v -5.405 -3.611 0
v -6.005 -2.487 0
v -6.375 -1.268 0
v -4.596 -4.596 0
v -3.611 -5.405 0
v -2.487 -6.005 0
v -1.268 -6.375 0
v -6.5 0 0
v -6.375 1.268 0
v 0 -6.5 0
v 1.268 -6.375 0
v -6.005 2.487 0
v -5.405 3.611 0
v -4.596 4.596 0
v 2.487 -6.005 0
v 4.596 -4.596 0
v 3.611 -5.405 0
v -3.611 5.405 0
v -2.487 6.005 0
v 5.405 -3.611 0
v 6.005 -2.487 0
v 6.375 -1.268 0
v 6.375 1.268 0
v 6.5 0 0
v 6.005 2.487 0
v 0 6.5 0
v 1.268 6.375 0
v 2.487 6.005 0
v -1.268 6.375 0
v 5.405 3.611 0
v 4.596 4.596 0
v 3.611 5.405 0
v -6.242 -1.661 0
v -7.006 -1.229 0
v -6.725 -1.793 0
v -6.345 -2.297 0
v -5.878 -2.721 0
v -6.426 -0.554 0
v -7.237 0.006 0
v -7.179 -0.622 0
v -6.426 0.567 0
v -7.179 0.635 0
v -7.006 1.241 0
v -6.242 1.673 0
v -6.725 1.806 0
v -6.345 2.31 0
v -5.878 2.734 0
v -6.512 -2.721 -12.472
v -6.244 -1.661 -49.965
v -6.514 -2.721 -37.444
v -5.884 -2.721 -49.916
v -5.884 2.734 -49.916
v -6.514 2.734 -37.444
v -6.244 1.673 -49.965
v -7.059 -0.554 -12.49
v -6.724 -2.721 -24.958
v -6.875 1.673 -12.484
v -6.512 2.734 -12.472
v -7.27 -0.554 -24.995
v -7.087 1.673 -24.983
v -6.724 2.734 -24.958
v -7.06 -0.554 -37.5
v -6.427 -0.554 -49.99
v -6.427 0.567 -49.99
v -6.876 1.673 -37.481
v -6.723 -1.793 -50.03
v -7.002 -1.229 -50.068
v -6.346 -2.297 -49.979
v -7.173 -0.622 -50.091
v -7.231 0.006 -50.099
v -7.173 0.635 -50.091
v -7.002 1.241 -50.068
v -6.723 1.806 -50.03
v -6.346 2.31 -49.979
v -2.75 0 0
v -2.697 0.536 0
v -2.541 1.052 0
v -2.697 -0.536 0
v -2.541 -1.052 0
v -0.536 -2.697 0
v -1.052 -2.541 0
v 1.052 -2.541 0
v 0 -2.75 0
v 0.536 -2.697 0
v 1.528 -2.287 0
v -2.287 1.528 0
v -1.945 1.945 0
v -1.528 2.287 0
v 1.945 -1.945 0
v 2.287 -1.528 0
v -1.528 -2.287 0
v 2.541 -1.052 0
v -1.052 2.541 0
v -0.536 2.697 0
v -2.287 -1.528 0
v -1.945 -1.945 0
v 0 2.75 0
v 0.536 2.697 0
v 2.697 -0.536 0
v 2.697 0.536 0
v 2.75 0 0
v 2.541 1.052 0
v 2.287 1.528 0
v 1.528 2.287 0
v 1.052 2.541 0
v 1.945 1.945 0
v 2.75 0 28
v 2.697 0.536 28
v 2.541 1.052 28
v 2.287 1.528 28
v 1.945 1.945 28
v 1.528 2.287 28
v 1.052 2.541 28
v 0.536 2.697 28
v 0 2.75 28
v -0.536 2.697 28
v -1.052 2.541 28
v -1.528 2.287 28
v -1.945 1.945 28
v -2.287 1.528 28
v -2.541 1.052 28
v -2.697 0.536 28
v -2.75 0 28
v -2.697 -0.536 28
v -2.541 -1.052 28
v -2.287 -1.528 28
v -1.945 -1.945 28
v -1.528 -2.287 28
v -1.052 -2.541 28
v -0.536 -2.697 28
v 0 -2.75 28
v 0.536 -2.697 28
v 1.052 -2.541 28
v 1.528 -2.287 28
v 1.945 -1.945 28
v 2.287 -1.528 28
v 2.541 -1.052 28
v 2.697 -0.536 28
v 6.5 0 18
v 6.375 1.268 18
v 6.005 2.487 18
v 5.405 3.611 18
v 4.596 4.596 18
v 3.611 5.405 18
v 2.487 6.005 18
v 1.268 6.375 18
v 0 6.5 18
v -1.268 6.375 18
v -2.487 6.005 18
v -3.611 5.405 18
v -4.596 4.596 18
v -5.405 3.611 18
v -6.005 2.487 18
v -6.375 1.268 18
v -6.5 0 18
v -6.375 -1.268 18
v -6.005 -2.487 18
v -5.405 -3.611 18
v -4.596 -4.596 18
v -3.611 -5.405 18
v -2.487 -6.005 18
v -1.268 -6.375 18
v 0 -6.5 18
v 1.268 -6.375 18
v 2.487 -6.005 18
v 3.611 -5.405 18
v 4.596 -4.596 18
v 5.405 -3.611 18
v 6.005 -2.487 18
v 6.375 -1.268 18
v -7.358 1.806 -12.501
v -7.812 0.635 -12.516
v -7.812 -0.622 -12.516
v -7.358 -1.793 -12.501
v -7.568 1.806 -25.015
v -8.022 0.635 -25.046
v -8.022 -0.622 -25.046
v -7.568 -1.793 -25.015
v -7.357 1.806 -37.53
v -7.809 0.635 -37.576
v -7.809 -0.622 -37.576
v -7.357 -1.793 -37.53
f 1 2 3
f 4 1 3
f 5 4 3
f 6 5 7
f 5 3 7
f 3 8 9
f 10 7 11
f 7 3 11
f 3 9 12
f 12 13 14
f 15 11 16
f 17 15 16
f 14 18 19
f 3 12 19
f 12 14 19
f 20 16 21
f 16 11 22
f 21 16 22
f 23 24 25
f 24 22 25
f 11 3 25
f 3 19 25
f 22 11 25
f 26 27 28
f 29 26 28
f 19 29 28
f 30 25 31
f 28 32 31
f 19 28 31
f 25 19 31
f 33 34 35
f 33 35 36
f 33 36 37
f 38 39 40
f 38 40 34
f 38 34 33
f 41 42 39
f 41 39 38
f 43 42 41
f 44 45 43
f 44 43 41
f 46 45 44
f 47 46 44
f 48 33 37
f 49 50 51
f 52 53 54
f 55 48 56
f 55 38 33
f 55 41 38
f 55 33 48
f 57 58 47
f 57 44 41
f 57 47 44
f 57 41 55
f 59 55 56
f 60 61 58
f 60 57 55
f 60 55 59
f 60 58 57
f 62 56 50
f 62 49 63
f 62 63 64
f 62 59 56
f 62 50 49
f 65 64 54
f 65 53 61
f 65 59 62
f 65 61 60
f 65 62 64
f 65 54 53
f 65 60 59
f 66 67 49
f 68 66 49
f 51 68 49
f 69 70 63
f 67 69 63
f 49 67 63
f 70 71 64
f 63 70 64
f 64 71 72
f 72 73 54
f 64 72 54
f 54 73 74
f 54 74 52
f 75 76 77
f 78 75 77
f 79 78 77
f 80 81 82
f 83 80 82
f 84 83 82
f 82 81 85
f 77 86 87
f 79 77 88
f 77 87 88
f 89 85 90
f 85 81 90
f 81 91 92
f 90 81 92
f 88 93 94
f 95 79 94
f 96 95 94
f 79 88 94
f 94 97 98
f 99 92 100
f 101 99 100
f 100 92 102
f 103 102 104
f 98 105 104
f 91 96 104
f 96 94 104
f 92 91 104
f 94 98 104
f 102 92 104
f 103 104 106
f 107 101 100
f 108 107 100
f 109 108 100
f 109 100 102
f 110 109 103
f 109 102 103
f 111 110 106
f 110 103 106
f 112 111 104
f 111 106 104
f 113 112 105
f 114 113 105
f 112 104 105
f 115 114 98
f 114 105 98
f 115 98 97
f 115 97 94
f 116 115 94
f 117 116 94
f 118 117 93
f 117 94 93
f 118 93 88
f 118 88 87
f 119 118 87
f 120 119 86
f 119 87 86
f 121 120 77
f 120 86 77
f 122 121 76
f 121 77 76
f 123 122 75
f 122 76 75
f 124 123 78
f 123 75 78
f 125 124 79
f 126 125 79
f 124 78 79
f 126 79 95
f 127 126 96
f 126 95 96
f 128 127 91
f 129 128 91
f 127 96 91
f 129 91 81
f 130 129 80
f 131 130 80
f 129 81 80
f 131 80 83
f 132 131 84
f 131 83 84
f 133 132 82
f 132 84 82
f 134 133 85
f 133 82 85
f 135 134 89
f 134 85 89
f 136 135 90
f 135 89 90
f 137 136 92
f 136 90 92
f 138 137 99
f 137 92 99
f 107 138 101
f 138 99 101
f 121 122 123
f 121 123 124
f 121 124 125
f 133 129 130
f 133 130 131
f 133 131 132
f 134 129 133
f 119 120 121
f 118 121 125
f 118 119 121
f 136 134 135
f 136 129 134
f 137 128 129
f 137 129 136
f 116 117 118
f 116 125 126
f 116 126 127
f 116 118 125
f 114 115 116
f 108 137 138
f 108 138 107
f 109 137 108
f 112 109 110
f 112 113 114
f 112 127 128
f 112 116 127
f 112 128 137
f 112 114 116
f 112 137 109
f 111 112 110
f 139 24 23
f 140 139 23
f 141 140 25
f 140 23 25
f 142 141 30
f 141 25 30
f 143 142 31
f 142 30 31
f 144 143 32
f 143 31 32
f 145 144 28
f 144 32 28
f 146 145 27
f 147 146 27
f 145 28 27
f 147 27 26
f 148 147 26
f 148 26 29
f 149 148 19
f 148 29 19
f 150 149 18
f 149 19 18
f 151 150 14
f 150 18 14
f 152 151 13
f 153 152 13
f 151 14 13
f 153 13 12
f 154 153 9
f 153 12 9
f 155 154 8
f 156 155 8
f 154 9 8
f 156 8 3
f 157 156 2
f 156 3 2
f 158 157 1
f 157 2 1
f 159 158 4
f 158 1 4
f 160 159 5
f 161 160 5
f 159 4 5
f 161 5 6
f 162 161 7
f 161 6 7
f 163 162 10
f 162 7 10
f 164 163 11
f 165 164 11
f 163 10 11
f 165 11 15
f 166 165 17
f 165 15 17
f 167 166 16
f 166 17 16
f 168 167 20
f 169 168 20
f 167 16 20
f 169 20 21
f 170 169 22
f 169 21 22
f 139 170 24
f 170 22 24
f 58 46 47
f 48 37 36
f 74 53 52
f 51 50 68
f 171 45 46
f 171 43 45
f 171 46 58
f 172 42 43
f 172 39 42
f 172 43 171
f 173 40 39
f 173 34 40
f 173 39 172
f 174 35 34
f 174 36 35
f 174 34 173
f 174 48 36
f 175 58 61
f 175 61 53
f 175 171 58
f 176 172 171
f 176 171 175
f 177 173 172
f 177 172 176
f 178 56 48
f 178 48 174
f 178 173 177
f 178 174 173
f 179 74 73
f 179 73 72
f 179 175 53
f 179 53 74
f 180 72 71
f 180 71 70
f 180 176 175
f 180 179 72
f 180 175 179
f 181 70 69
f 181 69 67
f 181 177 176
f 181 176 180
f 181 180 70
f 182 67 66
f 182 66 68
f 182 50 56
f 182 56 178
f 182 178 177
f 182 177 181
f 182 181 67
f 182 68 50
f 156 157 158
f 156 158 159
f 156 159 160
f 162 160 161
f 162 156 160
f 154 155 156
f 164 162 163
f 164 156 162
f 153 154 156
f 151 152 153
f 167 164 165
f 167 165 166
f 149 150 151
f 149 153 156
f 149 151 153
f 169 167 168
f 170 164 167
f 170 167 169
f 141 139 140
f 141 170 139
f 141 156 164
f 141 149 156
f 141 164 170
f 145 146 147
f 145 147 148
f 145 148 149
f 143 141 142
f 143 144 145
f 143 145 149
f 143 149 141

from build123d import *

# Parameters (mm, degrees)
F0_R     = 2.75
F5_DEPTH = 28
F1_R     = 6.5
F6_DEPTH = 18


with BuildPart() as f5:
    # F0 (on Top) → F5 (new body)
    with BuildSketch(Plane.XY):
        Circle(F0_R)
    extrude(amount=F5_DEPTH)


with BuildPart() as f6:
    # F1 (on Top) → F6 (new body)
    with BuildSketch(Plane.XY):
        Circle(F1_R)
    extrude(amount=F6_DEPTH)


with BuildPart() as f7:
    # F7: sweep along a path in F4
    with BuildLine(Plane.XZ) as f7_path:
        ThreePointArc((-6.4992159605, 0), (-7.3430806348, -25), (-6.4992159605, -50))
    # F3 (on Top) → F7 (sweep)
    with BuildSketch(Plane.XY):
        with BuildLine():
            ThreePointArc((-5.8783353306, -2.721416764), (-6.4495805989, 0.0064863125), (-5.8783353306, 2.7343893889))
            ThreePointArc((-5.8783353306, 2.7343893889), (-7.2374467799, 0.0064863125), (-5.8783353306, -2.721416764))
        make_face()
    sweep(path=f7_path.line)


solid = Compound([f5.part, f6.part, f7.part])
